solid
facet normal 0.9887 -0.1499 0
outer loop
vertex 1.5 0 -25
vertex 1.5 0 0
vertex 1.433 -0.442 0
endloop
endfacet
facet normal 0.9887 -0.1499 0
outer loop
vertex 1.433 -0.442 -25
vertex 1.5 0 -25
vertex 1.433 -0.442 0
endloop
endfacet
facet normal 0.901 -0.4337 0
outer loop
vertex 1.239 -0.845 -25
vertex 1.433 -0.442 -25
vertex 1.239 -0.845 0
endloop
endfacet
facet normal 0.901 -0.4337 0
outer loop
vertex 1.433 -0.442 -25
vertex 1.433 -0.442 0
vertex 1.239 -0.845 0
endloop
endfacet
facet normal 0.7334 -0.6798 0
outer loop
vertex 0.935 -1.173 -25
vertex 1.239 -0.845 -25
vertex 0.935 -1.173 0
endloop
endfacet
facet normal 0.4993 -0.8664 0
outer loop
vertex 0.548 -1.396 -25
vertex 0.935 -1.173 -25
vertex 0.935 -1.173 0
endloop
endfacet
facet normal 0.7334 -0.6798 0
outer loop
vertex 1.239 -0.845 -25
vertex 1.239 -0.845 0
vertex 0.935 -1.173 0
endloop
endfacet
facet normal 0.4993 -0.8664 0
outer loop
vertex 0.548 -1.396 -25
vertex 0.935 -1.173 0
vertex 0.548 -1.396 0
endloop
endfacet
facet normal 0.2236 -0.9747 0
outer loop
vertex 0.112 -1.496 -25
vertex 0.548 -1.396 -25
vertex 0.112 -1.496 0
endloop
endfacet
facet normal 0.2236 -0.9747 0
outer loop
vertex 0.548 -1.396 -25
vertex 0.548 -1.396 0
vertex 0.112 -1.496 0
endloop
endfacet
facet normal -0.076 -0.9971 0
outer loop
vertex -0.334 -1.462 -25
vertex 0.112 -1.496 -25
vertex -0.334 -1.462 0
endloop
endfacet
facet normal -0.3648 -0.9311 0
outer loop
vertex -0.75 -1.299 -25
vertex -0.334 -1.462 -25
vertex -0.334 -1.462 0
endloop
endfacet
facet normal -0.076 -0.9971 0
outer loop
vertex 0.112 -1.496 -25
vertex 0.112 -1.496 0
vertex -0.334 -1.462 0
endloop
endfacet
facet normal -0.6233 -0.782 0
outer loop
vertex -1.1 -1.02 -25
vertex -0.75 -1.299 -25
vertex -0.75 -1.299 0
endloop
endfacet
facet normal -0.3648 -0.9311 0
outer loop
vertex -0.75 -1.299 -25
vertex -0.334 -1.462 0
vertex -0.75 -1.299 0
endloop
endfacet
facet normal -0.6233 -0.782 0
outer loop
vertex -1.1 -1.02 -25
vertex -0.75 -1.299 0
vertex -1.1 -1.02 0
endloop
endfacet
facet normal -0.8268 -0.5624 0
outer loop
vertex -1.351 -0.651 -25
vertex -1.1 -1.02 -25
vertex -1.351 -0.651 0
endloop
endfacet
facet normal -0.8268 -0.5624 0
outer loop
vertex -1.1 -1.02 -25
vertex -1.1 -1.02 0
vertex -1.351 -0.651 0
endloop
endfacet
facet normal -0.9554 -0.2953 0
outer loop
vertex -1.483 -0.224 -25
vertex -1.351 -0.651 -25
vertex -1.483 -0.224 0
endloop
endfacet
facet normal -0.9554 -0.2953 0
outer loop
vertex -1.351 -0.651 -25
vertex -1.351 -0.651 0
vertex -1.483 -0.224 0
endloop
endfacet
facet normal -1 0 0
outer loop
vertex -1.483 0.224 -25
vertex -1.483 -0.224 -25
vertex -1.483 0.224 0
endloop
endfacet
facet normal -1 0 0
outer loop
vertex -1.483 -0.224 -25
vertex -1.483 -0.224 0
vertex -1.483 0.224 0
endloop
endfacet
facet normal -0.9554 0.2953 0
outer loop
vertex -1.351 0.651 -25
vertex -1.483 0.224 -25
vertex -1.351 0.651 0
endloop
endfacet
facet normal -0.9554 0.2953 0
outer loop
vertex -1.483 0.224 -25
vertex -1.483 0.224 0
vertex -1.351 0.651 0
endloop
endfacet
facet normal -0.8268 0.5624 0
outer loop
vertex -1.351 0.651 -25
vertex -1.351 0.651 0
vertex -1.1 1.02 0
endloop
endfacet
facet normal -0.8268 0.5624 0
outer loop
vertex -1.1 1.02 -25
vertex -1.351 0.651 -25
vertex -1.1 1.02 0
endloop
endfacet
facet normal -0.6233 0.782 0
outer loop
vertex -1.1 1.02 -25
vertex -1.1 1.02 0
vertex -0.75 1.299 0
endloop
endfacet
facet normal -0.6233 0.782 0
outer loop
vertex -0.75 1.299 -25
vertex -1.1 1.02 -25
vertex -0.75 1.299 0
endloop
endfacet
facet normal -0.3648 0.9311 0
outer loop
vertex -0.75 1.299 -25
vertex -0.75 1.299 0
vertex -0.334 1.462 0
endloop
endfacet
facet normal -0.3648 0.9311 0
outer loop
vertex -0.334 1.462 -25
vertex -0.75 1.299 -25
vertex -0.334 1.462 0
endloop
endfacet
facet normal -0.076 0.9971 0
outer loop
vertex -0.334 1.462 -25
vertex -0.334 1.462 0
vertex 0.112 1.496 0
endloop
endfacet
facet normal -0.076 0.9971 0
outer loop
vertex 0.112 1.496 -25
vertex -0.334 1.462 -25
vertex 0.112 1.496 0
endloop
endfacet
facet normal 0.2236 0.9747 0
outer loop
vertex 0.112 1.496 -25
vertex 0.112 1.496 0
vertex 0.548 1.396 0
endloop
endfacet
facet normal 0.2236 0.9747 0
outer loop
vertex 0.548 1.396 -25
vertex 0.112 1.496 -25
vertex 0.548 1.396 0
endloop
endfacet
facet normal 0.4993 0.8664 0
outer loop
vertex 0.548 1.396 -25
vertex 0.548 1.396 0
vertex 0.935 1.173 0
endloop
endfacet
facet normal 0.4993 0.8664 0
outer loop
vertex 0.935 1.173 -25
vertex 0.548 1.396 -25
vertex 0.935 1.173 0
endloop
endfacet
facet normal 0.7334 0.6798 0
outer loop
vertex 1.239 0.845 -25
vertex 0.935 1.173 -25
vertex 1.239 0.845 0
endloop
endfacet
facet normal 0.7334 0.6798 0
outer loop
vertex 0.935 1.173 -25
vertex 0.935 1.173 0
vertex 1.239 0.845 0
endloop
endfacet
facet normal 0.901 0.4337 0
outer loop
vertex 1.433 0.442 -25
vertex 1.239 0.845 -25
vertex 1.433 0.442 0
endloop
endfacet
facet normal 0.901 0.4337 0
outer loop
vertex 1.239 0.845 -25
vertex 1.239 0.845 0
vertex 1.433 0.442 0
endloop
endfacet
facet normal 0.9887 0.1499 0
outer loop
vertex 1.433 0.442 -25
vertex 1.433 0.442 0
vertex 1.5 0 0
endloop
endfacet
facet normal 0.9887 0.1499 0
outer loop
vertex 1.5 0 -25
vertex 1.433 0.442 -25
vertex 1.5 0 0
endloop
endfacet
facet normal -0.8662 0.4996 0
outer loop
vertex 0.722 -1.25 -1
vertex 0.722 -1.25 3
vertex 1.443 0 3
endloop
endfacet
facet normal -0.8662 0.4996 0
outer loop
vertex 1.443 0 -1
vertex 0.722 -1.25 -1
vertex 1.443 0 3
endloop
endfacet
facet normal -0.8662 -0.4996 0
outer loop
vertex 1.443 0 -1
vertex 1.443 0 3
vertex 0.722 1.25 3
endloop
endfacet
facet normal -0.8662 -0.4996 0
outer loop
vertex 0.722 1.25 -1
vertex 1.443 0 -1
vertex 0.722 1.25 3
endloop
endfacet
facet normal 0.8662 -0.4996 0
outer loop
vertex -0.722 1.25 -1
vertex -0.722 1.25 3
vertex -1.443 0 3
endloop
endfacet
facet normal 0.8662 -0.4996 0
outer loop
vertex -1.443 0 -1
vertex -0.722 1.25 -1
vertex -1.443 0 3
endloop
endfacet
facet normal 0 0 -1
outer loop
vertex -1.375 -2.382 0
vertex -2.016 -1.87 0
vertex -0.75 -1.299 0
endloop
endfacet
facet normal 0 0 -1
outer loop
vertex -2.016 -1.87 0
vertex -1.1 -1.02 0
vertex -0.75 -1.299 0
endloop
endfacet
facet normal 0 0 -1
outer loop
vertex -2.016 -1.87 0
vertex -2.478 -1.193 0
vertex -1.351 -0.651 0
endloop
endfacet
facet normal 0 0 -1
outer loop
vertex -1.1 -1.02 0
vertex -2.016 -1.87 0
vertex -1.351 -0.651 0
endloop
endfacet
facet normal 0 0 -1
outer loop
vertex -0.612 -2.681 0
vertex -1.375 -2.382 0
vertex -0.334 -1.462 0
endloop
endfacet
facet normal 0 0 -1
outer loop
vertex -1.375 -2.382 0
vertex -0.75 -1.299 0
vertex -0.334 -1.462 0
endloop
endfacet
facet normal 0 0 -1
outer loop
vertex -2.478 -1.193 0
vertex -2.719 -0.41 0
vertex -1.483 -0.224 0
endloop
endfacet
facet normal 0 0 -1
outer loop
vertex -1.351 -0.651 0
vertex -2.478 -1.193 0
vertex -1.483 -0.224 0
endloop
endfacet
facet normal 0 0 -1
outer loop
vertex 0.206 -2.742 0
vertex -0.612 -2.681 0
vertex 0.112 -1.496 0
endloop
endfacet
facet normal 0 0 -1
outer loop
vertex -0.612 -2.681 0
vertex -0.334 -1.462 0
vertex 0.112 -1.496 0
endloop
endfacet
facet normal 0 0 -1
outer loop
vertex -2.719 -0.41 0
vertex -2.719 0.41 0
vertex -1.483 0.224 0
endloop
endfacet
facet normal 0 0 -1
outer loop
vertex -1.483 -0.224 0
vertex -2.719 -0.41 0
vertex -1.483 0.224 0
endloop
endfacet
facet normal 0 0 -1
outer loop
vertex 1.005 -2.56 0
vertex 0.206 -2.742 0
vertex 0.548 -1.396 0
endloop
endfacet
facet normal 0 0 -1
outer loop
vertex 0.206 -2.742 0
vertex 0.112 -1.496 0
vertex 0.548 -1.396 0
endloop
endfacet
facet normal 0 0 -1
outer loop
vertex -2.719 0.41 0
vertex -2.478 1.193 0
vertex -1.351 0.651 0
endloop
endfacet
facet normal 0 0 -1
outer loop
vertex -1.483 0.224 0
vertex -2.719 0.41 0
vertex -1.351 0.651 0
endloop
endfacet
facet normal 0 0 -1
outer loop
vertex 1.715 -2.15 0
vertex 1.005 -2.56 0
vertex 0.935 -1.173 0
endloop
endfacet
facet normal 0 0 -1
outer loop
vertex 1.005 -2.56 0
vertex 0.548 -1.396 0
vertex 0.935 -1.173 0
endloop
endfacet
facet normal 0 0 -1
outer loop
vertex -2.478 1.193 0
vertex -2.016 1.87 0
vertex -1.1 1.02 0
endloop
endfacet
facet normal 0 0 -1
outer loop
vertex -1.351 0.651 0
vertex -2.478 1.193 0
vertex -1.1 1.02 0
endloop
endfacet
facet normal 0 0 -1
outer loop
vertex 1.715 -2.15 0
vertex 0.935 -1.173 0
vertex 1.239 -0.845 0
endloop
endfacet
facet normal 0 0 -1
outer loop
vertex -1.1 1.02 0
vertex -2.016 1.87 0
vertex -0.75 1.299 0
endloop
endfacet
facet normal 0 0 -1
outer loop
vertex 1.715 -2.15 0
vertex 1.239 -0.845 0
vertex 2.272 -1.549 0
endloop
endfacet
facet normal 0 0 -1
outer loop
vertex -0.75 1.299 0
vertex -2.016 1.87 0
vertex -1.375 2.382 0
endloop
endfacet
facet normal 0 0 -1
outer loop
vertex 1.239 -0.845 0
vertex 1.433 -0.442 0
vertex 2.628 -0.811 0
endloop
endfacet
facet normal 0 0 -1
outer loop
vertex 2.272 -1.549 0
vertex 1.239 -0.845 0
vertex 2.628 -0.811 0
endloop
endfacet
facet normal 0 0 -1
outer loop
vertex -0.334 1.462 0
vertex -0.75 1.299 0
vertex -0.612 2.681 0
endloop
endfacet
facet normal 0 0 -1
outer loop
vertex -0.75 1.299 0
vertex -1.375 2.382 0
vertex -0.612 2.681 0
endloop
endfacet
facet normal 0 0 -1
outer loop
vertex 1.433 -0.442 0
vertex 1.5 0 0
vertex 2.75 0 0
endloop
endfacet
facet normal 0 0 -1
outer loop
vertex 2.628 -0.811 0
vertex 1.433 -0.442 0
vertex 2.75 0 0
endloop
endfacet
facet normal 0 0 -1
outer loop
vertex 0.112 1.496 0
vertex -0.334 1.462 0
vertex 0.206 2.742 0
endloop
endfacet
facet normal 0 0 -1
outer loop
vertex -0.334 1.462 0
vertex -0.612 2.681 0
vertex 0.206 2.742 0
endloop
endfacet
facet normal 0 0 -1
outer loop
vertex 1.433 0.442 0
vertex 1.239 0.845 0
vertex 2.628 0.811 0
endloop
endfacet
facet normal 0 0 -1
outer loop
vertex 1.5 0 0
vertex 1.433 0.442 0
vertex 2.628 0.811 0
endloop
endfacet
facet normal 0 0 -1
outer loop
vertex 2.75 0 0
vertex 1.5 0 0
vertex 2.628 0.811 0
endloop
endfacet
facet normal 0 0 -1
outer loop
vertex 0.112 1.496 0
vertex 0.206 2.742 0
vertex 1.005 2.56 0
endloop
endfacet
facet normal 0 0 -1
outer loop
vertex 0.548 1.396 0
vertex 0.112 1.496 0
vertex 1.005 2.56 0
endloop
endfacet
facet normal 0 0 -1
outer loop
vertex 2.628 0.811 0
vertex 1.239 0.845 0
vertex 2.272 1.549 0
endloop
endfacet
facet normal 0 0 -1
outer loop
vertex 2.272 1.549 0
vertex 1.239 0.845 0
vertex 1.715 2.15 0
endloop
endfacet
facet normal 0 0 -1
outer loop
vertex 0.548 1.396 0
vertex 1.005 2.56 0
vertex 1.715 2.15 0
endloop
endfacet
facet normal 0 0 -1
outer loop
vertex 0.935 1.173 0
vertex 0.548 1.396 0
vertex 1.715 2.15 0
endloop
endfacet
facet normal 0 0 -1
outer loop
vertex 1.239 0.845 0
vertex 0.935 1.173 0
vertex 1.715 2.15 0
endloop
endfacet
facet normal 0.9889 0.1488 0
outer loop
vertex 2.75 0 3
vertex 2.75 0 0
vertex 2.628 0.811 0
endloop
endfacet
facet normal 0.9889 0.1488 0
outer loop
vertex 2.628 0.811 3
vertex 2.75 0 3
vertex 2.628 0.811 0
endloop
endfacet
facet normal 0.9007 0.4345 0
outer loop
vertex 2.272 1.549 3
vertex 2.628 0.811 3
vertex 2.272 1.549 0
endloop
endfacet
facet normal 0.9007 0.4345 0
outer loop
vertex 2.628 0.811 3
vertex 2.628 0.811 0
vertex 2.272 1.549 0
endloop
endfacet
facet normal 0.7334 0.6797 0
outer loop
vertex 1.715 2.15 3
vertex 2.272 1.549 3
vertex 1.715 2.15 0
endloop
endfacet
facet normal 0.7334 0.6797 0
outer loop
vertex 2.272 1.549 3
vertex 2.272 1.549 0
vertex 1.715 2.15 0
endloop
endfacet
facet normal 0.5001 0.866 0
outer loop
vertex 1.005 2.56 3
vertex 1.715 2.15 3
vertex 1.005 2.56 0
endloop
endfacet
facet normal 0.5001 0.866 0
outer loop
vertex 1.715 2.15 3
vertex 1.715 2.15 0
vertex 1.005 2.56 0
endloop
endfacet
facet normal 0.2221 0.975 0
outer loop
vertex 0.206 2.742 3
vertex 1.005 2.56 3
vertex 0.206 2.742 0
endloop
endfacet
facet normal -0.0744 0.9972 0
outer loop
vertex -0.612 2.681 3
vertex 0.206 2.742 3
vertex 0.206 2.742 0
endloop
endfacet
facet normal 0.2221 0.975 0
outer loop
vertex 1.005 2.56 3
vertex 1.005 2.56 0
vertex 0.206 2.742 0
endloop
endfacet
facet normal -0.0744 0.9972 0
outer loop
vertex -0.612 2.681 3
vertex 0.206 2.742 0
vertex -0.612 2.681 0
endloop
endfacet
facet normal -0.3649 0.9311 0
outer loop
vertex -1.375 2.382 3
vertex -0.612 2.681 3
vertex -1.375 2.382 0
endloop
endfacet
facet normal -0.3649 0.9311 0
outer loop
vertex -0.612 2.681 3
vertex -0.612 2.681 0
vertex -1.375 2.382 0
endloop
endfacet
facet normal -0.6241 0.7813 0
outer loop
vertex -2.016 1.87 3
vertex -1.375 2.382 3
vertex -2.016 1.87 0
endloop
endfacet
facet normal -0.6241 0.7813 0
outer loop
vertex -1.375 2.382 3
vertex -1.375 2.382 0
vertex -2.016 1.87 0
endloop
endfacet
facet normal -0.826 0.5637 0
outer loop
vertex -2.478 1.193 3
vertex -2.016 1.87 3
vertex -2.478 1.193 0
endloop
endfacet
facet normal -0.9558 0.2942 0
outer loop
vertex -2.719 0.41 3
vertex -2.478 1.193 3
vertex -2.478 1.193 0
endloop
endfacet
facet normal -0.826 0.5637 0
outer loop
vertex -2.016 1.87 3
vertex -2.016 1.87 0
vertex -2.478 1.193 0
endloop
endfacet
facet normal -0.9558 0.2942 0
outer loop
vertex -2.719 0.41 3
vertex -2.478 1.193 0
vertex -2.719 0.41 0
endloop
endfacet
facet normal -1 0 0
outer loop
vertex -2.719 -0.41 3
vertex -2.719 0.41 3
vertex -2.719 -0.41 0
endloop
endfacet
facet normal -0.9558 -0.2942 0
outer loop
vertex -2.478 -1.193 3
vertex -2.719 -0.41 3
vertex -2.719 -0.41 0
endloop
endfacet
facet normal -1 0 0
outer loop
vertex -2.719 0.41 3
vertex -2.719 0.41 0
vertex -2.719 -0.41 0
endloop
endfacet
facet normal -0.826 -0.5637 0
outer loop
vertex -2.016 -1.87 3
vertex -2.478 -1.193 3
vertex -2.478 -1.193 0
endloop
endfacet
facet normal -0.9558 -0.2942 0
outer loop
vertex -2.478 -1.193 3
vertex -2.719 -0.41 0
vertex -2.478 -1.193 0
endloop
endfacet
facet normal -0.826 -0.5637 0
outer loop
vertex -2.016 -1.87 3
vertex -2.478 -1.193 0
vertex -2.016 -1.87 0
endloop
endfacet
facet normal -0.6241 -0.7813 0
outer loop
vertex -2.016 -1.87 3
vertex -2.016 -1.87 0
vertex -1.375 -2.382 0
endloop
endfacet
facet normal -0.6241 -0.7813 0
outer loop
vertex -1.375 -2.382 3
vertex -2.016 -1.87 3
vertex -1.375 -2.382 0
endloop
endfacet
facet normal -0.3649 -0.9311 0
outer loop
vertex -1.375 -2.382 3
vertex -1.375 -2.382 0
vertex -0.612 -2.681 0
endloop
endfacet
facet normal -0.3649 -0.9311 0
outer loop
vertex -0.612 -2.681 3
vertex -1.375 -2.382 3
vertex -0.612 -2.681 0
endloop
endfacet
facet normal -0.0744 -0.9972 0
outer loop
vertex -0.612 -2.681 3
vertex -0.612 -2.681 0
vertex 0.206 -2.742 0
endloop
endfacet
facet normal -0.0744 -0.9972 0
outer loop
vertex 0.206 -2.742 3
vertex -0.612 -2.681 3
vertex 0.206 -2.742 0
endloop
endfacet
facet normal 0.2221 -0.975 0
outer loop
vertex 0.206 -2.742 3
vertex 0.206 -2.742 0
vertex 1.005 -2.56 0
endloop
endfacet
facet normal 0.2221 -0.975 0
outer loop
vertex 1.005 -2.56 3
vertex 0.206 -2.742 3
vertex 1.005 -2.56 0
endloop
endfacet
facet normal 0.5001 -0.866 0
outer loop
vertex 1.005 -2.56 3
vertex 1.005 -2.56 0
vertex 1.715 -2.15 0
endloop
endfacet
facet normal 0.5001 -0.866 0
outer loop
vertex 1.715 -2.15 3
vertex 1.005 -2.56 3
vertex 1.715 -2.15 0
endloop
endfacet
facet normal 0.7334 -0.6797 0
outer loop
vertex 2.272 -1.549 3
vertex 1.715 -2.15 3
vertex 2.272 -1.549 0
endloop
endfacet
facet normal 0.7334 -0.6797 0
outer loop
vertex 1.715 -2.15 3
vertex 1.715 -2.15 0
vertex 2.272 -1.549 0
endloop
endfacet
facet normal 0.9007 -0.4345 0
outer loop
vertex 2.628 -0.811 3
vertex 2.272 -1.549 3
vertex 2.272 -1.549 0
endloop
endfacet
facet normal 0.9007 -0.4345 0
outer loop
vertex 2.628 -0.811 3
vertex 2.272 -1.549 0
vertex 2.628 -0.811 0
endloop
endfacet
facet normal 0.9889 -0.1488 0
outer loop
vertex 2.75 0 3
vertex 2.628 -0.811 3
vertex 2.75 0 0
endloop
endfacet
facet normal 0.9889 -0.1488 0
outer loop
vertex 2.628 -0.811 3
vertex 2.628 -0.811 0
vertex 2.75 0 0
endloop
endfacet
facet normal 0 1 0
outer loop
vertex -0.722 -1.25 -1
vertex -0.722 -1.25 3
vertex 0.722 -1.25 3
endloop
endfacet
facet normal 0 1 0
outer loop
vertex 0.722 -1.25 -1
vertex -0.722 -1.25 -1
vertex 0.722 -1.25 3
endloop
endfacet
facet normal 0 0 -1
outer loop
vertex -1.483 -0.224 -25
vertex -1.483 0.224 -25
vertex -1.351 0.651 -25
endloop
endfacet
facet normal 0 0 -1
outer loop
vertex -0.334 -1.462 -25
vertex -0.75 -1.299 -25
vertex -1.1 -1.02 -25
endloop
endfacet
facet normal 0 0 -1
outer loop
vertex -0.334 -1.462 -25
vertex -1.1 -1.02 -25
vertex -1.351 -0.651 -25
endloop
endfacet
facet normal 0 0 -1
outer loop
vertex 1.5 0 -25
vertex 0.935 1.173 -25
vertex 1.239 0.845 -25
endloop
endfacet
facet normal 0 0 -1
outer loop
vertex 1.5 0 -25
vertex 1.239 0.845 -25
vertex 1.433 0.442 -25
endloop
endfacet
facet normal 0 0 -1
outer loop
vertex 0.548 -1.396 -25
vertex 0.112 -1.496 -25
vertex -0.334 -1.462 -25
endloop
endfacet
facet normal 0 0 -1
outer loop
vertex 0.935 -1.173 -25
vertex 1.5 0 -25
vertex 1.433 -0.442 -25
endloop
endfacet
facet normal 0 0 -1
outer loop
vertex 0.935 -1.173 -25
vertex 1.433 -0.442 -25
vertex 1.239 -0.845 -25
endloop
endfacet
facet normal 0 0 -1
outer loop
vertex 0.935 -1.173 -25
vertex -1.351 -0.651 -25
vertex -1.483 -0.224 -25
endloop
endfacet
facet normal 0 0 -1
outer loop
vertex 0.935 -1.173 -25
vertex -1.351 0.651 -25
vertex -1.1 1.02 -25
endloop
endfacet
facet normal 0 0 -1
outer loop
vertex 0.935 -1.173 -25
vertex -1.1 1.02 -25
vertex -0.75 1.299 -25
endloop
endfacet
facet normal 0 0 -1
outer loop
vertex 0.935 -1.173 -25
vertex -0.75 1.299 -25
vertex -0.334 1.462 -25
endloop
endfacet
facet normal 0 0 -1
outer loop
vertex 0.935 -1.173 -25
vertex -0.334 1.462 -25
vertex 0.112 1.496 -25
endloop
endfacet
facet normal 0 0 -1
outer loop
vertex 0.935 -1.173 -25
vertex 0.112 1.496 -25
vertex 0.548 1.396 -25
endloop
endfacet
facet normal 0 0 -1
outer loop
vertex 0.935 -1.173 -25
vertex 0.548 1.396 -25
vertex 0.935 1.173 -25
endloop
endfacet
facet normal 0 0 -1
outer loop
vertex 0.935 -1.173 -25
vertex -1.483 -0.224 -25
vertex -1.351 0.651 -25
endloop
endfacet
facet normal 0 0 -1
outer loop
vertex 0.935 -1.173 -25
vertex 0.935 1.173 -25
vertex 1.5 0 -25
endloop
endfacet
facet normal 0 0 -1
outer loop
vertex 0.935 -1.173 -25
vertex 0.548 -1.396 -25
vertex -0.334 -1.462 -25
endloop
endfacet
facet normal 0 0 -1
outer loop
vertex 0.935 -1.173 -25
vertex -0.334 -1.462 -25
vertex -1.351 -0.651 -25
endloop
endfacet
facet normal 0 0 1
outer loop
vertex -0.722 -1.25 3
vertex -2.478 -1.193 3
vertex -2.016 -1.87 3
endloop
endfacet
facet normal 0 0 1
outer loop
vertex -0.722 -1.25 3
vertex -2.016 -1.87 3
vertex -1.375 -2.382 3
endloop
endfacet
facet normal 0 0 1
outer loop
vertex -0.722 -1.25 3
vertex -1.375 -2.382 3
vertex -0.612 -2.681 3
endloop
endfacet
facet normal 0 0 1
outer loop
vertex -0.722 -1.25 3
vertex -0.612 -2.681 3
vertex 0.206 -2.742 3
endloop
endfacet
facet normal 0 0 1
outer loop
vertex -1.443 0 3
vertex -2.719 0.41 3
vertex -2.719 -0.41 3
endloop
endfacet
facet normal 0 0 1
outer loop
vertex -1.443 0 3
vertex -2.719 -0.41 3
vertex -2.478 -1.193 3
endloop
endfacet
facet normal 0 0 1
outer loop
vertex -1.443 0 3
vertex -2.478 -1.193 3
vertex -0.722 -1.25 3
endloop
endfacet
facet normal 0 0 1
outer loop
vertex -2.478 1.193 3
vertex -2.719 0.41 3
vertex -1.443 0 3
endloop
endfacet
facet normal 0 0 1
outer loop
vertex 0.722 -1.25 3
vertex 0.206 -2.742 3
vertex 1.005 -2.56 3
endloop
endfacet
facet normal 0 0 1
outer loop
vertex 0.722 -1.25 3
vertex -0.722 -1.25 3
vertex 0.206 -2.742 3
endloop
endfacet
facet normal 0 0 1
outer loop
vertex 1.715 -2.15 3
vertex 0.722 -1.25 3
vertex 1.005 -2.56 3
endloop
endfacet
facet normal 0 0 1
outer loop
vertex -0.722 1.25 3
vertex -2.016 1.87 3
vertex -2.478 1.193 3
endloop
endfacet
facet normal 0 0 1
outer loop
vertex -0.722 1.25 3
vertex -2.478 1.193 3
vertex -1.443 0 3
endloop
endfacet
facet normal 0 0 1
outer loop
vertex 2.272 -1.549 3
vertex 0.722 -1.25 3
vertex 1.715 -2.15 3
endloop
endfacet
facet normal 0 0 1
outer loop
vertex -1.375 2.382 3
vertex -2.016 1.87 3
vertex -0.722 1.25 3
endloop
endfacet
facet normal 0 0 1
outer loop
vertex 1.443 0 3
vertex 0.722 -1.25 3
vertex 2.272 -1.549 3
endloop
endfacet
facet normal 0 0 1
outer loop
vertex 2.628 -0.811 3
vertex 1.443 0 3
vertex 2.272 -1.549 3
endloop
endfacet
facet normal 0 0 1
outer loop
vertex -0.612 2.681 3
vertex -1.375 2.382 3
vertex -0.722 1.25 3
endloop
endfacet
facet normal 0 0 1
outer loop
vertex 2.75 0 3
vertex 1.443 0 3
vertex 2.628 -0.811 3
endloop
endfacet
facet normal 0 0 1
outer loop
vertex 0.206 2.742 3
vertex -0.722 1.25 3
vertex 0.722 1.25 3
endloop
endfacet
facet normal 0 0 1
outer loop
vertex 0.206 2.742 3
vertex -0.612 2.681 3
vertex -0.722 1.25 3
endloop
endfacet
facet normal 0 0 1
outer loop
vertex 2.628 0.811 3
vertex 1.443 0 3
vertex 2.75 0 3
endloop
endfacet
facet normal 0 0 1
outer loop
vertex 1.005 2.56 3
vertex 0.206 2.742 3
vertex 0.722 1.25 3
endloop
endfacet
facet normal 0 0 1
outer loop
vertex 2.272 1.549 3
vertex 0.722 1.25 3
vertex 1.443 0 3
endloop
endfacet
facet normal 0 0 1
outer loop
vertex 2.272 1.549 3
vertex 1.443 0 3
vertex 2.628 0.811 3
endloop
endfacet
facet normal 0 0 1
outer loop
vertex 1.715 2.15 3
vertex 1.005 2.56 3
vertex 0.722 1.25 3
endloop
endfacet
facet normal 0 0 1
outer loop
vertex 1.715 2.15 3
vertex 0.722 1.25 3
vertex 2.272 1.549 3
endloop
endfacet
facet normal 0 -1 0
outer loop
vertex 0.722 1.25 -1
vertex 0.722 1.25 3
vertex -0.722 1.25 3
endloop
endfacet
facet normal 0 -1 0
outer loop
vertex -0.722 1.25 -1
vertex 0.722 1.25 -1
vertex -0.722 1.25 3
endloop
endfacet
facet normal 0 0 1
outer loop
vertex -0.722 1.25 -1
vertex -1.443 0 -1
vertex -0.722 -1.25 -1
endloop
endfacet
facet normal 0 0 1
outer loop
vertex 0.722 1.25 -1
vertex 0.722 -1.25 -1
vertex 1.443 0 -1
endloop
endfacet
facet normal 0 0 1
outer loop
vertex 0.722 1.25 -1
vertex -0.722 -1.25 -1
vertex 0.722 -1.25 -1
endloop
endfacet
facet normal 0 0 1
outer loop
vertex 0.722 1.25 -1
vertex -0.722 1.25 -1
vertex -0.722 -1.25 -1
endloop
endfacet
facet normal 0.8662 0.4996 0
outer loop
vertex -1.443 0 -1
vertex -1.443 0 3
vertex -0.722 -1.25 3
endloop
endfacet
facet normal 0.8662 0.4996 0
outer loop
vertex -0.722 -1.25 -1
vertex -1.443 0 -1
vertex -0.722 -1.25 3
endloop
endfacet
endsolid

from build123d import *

# Parameters (mm, degrees)
SKETCH_R     = 2.75
PAD_DEPTH    = 3
SKETCH001_R  = 1.5
PAD001_DEPTH = 25
POCKET_DEPTH = 4


with BuildPart() as part:
    # Sketch → Pad (new body)
    with BuildSketch(Plane.XY):
        Circle(SKETCH_R)
    extrude(amount=PAD_DEPTH)

    # Sketch001 (on Face2 of Pad) → Pad001 (join)
    with BuildSketch(Plane(origin=(0, 0, 0), x_dir=(1, 0, 0), z_dir=(0, 0, -1))):
        Circle(SKETCH001_R)
    extrude(amount=PAD001_DEPTH)

    # Sketch002 (on DatumPlane) → Pocket (cut)
    with BuildSketch(Plane.XY.offset(3)):
        Polygon((0.721688, -1.25), (1.443376, 0), (0.721688, 1.25), (-0.721688, 1.25), (-1.443376, 0), (-0.721688, -1.25), align=None)
    extrude(amount=-POCKET_DEPTH, mode=Mode.SUBTRACT)


solid = part.part
